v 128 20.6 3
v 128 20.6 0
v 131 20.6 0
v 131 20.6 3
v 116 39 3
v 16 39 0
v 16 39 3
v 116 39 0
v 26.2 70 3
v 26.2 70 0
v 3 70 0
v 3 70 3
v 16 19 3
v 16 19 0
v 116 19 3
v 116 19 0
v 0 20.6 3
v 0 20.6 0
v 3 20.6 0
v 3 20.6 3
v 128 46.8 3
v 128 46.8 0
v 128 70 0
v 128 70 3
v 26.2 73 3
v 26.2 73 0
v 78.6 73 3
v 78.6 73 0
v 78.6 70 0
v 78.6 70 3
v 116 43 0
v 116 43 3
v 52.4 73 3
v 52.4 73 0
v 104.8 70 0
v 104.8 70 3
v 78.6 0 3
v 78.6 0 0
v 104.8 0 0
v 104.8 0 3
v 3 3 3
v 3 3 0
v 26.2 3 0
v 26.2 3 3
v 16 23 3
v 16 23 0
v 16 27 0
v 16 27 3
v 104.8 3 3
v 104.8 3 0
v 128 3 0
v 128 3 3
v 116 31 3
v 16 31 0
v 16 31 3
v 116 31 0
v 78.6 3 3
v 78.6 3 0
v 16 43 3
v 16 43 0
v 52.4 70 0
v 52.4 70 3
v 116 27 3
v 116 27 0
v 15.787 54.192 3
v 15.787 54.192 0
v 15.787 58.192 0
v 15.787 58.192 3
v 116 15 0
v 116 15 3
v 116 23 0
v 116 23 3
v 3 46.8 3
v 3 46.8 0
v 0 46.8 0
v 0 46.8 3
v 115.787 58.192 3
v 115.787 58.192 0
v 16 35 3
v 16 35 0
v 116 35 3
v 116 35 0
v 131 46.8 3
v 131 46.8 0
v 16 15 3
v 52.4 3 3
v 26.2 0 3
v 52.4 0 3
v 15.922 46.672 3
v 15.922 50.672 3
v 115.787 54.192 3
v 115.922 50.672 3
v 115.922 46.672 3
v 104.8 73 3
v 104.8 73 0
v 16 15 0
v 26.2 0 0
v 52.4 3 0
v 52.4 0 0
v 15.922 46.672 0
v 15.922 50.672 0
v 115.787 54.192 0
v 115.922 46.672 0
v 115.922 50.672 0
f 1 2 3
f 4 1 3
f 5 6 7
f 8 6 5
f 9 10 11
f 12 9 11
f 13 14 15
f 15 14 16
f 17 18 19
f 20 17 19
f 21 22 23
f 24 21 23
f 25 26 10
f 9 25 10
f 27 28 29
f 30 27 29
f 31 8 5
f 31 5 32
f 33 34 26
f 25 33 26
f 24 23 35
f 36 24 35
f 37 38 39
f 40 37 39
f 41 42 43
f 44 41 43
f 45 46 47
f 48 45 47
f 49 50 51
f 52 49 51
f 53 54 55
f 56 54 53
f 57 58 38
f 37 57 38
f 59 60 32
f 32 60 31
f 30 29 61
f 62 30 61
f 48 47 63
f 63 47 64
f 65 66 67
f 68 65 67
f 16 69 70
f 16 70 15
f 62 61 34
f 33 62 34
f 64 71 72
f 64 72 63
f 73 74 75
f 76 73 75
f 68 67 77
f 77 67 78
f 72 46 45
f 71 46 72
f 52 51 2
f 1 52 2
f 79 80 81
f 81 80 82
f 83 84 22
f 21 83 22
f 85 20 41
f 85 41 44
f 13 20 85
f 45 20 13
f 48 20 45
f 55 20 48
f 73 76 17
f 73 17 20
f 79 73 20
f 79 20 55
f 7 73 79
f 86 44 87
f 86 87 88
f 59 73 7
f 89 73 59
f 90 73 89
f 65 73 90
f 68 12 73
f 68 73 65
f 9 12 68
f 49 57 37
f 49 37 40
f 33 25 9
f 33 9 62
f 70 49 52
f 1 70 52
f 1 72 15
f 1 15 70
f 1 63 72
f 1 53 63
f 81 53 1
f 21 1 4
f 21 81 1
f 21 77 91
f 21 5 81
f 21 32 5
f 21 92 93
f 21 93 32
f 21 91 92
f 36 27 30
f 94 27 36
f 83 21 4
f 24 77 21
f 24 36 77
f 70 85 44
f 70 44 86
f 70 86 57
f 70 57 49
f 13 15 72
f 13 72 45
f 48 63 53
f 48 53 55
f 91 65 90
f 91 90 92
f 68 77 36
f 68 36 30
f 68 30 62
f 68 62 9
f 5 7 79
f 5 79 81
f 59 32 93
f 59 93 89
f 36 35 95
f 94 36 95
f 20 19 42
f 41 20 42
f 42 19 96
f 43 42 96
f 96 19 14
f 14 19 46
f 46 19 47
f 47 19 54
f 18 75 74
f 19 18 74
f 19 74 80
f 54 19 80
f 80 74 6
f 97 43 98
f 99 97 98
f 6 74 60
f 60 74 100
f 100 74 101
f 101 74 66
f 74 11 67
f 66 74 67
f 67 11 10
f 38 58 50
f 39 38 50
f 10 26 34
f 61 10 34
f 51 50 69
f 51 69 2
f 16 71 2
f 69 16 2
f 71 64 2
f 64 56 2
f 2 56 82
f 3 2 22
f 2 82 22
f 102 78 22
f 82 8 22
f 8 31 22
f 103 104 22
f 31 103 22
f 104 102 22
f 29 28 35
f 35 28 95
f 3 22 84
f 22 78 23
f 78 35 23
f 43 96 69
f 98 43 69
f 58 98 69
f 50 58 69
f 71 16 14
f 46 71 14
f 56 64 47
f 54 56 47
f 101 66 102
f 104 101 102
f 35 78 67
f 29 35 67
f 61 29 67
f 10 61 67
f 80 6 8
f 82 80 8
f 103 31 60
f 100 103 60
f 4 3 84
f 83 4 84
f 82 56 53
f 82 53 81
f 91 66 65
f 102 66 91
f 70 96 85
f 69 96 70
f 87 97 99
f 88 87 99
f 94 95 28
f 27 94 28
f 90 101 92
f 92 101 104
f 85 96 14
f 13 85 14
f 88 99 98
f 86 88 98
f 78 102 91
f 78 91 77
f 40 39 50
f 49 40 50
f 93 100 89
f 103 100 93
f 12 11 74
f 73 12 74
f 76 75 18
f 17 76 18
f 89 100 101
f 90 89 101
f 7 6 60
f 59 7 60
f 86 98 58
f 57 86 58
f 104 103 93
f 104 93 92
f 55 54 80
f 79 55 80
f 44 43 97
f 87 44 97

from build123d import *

# Parameters (mm, degrees)
SKETCH1_W           = 100
SKETCH1_H           = 4
BOSS_EXTRUDE1_DEPTH = 3


with BuildPart() as part:
    # Sketch1 → Boss-Extrude1 (new body)
    with BuildSketch(Plane.XY):
        Polygon((104.8, 73), (78.6, 73), (78.6, 70), (52.4, 70), (52.4, 73), (26.2, 73), (26.2, 70), (3, 70), (3, 46.8), (0, 46.8), (0, 20.6), (3, 20.6), (3, 3), (26.2, 3), (26.2, 0), (52.4, 0), (52.4, 3), (78.6, 3), (78.6, 0), (104.8, 0), (104.8, 3), (128, 3), (128, 20.6), (131, 20.6), (131, 46.8), (128, 46.8), (128, 70), (104.8, 70), align=None)
        with Locations((66, 17)):
            Rectangle(SKETCH1_W, SKETCH1_H, mode=Mode.SUBTRACT)
        with Locations((66, 25)):
            Rectangle(SKETCH1_W, SKETCH1_H, mode=Mode.SUBTRACT)
        with Locations((66, 33)):
            Rectangle(SKETCH1_W, SKETCH1_H, mode=Mode.SUBTRACT)
        with Locations((66, 41)):
            Rectangle(SKETCH1_W, SKETCH1_H, mode=Mode.SUBTRACT)
        with Locations((65.921603012, 48.672040999)):
            Rectangle(SKETCH1_W, SKETCH1_H, mode=Mode.SUBTRACT)
        with Locations((65.787326392, 56.191531722)):
            Rectangle(SKETCH1_W, SKETCH1_H, mode=Mode.SUBTRACT)
    extrude(amount=BOSS_EXTRUDE1_DEPTH)


solid = part.part
